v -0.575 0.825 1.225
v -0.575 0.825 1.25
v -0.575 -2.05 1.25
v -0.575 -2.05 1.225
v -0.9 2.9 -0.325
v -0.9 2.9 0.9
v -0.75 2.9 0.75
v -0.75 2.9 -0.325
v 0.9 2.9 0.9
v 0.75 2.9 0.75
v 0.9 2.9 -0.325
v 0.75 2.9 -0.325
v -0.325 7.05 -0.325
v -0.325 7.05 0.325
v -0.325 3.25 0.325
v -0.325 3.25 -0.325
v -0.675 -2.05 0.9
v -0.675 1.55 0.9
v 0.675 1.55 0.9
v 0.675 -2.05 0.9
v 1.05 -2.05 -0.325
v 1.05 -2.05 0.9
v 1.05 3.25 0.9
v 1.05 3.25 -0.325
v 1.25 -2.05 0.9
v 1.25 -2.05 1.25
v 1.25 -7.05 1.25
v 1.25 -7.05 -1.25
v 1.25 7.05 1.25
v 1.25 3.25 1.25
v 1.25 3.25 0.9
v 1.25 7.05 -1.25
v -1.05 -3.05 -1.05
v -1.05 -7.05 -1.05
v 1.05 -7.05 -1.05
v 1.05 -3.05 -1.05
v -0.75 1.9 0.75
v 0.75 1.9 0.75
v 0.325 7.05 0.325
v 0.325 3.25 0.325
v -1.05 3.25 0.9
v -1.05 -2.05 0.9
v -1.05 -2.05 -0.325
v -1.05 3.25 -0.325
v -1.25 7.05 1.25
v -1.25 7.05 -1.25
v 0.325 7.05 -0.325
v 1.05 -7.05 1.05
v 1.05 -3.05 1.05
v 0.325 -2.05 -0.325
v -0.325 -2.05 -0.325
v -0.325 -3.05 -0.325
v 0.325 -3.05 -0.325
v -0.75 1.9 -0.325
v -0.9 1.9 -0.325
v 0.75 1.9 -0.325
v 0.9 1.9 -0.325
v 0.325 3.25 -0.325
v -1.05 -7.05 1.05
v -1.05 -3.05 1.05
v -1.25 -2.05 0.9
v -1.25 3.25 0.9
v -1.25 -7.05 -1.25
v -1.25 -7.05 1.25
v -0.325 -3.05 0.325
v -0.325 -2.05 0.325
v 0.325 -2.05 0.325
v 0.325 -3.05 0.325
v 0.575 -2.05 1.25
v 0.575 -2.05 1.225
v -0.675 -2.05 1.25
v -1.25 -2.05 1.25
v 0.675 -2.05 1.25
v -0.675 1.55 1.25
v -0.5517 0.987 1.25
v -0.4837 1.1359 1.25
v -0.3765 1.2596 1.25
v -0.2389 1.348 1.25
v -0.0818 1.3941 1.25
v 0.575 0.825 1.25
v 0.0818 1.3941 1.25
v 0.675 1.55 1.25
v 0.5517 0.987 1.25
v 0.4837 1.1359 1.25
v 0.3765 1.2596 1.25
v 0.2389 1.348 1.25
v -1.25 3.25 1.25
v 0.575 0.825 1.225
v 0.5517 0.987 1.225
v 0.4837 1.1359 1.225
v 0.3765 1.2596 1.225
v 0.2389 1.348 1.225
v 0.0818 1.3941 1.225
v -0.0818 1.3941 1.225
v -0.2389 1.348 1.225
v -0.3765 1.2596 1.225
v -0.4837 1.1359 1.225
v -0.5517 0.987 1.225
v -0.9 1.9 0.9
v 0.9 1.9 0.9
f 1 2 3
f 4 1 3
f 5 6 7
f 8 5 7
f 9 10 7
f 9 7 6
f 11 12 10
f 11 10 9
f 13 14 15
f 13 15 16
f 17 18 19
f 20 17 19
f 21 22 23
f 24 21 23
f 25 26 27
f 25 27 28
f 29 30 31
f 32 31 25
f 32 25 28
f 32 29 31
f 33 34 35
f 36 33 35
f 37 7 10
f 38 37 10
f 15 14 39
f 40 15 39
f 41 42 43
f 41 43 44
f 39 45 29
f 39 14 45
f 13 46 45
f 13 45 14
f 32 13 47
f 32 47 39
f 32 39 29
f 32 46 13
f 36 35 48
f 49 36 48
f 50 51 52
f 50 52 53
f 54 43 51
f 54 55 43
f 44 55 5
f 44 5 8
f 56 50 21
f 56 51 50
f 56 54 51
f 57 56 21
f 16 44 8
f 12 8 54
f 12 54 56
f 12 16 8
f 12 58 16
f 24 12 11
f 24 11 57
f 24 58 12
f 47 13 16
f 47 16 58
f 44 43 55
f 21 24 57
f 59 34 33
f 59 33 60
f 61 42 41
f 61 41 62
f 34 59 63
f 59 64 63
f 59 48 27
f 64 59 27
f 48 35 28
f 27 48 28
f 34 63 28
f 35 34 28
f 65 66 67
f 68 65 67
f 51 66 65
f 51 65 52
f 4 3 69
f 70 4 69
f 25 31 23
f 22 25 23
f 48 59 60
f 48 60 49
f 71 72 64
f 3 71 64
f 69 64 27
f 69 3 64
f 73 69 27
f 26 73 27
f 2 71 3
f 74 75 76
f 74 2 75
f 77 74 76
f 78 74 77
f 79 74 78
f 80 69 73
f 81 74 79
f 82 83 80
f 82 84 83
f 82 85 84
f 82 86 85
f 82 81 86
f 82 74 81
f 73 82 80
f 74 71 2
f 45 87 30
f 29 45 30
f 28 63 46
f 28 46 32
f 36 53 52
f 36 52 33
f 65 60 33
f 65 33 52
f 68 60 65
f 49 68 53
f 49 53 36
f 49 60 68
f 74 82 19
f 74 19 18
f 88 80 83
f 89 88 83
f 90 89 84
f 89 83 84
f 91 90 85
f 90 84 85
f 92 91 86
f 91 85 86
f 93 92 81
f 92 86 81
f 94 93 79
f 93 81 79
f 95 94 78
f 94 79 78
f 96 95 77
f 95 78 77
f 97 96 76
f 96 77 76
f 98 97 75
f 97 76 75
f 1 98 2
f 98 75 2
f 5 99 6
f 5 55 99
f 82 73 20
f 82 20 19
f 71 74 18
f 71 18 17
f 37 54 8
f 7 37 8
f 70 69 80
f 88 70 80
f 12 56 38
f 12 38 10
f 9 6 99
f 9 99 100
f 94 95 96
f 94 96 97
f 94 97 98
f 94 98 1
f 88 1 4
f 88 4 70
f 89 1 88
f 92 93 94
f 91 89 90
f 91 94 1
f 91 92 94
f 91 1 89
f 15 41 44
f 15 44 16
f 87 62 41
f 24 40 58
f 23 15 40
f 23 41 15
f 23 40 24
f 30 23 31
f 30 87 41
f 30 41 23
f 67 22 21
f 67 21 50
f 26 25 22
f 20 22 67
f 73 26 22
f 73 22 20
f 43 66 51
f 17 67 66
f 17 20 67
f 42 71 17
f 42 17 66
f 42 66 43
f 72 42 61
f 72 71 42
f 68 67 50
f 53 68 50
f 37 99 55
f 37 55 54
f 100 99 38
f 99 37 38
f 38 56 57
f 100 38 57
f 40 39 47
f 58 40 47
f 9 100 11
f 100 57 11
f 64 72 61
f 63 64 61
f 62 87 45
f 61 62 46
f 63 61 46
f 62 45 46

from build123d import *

# Parameters (mm, degrees)
SKETCH2_W           = 2.5
SKETCH2_H           = 2.5
BOSS_EXTRUDE1_DEPTH = 7.05
PINHOLE_REACH       = 16.1
SKETCH3_W           = 0.65
SKETCH3_H           = 0.65
CUT_EXTRUDE2_DEPTH  = 0.35
SKETCH5_W           = 2.1
SKETCH5_H           = 5.3
CUT_EXTRUDE3_DEPTH  = 1.225
CUT_EXTRUDE5_DEPTH  = 0.025
SKETCH7_W           = 2.1
SKETCH7_H           = 2.1
CUT_EXTRUDE6_DEPTH  = 4
SKETCH9_W           = 0.15
SKETCH9_H           = 1
HOLDER_1_DEPTH      = 1.075
SKETCH10_W          = 1.8
SKETCH10_H          = 1
HOLDER_2_DEPTH      = 0.15


with BuildPart() as part:
    # Sketch2 → Boss-Extrude1 (new body, symmetric)
    with BuildSketch(Plane(origin=(0, 0, 0), x_dir=(1, 0, 0), z_dir=(0, 1, 0))):
        Rectangle(SKETCH2_W, SKETCH2_H)
    extrude(amount=BOSS_EXTRUDE1_DEPTH, both=True)

    # Sketch3 → Pinhole (cut, up to next)
    with BuildSketch(Plane(origin=(0, 7.05, 0), x_dir=(1, 0, 0), z_dir=(0, 1, 0)), mode=Mode.PRIVATE) as pinhole_sk1:
        Rectangle(SKETCH3_W, SKETCH3_H)
    pinhole_tool1 = extrude(pinhole_sk1.sketch, amount=-PINHOLE_REACH, mode=Mode.PRIVATE) & part.part
    add(pinhole_tool1.solids().sort_by_distance((0, 7.05, 0))[0], mode=Mode.SUBTRACT)

    # Sketch4 → Cut-Extrude2 (cut)
    with BuildSketch(Plane.XY.offset(1.25)):
        Polygon((-1.25, 3.25), (1.25, 3.25), (1.25, -2.05), (0.675, -2.05), (0.675, 1.55), (-0.675, 1.55), (-0.675, -2.05), (-1.25, -2.05), align=None)
    extrude(amount=-CUT_EXTRUDE2_DEPTH, mode=Mode.SUBTRACT)

    # Sketch5 → Cut-Extrude3 (cut)
    with BuildSketch(Plane.XY.offset(0.9)):
        with Locations((0, 0.6)):
            Rectangle(SKETCH5_W, SKETCH5_H)
    extrude(amount=-CUT_EXTRUDE3_DEPTH, mode=Mode.SUBTRACT)

    # Sketch6 → Cut-Extrude5 (cut)
    with BuildSketch(Plane.XY.offset(1.25)):
        with BuildLine():
            Line((-0.575, 0.825), (-0.575, -2.05))
            Line((-0.575, -2.05), (0.575, -2.05))
            Line((0.575, -2.05), (0.575, 0.825))
            ThreePointArc((0.575, 0.825), (0, 1.4), (-0.575, 0.825))
        make_face()
    extrude(amount=-CUT_EXTRUDE5_DEPTH, mode=Mode.SUBTRACT)

    # Sketch7 → Cut-Extrude6 (cut)
    with BuildSketch(Plane.XZ.offset(7.05)):
        Rectangle(SKETCH7_W, SKETCH7_H)
    extrude(amount=-CUT_EXTRUDE6_DEPTH, mode=Mode.SUBTRACT)

    # Sketch9 → Holder-1 (add)
    with BuildSketch(Plane.XY.offset(-0.325)):
        with Locations((-0.825, 2.4)):
            Rectangle(SKETCH9_W, SKETCH9_H)
        with Locations((0.825, 2.4)):
            Rectangle(SKETCH9_W, SKETCH9_H)
    extrude(amount=HOLDER_1_DEPTH)

    # Sketch10 → Holder-2 (add)
    with BuildSketch(Plane.XY.offset(0.75)):
        with Locations((0, 2.4)):
            Rectangle(SKETCH10_W, SKETCH10_H)
    extrude(amount=HOLDER_2_DEPTH)


solid = part.part
